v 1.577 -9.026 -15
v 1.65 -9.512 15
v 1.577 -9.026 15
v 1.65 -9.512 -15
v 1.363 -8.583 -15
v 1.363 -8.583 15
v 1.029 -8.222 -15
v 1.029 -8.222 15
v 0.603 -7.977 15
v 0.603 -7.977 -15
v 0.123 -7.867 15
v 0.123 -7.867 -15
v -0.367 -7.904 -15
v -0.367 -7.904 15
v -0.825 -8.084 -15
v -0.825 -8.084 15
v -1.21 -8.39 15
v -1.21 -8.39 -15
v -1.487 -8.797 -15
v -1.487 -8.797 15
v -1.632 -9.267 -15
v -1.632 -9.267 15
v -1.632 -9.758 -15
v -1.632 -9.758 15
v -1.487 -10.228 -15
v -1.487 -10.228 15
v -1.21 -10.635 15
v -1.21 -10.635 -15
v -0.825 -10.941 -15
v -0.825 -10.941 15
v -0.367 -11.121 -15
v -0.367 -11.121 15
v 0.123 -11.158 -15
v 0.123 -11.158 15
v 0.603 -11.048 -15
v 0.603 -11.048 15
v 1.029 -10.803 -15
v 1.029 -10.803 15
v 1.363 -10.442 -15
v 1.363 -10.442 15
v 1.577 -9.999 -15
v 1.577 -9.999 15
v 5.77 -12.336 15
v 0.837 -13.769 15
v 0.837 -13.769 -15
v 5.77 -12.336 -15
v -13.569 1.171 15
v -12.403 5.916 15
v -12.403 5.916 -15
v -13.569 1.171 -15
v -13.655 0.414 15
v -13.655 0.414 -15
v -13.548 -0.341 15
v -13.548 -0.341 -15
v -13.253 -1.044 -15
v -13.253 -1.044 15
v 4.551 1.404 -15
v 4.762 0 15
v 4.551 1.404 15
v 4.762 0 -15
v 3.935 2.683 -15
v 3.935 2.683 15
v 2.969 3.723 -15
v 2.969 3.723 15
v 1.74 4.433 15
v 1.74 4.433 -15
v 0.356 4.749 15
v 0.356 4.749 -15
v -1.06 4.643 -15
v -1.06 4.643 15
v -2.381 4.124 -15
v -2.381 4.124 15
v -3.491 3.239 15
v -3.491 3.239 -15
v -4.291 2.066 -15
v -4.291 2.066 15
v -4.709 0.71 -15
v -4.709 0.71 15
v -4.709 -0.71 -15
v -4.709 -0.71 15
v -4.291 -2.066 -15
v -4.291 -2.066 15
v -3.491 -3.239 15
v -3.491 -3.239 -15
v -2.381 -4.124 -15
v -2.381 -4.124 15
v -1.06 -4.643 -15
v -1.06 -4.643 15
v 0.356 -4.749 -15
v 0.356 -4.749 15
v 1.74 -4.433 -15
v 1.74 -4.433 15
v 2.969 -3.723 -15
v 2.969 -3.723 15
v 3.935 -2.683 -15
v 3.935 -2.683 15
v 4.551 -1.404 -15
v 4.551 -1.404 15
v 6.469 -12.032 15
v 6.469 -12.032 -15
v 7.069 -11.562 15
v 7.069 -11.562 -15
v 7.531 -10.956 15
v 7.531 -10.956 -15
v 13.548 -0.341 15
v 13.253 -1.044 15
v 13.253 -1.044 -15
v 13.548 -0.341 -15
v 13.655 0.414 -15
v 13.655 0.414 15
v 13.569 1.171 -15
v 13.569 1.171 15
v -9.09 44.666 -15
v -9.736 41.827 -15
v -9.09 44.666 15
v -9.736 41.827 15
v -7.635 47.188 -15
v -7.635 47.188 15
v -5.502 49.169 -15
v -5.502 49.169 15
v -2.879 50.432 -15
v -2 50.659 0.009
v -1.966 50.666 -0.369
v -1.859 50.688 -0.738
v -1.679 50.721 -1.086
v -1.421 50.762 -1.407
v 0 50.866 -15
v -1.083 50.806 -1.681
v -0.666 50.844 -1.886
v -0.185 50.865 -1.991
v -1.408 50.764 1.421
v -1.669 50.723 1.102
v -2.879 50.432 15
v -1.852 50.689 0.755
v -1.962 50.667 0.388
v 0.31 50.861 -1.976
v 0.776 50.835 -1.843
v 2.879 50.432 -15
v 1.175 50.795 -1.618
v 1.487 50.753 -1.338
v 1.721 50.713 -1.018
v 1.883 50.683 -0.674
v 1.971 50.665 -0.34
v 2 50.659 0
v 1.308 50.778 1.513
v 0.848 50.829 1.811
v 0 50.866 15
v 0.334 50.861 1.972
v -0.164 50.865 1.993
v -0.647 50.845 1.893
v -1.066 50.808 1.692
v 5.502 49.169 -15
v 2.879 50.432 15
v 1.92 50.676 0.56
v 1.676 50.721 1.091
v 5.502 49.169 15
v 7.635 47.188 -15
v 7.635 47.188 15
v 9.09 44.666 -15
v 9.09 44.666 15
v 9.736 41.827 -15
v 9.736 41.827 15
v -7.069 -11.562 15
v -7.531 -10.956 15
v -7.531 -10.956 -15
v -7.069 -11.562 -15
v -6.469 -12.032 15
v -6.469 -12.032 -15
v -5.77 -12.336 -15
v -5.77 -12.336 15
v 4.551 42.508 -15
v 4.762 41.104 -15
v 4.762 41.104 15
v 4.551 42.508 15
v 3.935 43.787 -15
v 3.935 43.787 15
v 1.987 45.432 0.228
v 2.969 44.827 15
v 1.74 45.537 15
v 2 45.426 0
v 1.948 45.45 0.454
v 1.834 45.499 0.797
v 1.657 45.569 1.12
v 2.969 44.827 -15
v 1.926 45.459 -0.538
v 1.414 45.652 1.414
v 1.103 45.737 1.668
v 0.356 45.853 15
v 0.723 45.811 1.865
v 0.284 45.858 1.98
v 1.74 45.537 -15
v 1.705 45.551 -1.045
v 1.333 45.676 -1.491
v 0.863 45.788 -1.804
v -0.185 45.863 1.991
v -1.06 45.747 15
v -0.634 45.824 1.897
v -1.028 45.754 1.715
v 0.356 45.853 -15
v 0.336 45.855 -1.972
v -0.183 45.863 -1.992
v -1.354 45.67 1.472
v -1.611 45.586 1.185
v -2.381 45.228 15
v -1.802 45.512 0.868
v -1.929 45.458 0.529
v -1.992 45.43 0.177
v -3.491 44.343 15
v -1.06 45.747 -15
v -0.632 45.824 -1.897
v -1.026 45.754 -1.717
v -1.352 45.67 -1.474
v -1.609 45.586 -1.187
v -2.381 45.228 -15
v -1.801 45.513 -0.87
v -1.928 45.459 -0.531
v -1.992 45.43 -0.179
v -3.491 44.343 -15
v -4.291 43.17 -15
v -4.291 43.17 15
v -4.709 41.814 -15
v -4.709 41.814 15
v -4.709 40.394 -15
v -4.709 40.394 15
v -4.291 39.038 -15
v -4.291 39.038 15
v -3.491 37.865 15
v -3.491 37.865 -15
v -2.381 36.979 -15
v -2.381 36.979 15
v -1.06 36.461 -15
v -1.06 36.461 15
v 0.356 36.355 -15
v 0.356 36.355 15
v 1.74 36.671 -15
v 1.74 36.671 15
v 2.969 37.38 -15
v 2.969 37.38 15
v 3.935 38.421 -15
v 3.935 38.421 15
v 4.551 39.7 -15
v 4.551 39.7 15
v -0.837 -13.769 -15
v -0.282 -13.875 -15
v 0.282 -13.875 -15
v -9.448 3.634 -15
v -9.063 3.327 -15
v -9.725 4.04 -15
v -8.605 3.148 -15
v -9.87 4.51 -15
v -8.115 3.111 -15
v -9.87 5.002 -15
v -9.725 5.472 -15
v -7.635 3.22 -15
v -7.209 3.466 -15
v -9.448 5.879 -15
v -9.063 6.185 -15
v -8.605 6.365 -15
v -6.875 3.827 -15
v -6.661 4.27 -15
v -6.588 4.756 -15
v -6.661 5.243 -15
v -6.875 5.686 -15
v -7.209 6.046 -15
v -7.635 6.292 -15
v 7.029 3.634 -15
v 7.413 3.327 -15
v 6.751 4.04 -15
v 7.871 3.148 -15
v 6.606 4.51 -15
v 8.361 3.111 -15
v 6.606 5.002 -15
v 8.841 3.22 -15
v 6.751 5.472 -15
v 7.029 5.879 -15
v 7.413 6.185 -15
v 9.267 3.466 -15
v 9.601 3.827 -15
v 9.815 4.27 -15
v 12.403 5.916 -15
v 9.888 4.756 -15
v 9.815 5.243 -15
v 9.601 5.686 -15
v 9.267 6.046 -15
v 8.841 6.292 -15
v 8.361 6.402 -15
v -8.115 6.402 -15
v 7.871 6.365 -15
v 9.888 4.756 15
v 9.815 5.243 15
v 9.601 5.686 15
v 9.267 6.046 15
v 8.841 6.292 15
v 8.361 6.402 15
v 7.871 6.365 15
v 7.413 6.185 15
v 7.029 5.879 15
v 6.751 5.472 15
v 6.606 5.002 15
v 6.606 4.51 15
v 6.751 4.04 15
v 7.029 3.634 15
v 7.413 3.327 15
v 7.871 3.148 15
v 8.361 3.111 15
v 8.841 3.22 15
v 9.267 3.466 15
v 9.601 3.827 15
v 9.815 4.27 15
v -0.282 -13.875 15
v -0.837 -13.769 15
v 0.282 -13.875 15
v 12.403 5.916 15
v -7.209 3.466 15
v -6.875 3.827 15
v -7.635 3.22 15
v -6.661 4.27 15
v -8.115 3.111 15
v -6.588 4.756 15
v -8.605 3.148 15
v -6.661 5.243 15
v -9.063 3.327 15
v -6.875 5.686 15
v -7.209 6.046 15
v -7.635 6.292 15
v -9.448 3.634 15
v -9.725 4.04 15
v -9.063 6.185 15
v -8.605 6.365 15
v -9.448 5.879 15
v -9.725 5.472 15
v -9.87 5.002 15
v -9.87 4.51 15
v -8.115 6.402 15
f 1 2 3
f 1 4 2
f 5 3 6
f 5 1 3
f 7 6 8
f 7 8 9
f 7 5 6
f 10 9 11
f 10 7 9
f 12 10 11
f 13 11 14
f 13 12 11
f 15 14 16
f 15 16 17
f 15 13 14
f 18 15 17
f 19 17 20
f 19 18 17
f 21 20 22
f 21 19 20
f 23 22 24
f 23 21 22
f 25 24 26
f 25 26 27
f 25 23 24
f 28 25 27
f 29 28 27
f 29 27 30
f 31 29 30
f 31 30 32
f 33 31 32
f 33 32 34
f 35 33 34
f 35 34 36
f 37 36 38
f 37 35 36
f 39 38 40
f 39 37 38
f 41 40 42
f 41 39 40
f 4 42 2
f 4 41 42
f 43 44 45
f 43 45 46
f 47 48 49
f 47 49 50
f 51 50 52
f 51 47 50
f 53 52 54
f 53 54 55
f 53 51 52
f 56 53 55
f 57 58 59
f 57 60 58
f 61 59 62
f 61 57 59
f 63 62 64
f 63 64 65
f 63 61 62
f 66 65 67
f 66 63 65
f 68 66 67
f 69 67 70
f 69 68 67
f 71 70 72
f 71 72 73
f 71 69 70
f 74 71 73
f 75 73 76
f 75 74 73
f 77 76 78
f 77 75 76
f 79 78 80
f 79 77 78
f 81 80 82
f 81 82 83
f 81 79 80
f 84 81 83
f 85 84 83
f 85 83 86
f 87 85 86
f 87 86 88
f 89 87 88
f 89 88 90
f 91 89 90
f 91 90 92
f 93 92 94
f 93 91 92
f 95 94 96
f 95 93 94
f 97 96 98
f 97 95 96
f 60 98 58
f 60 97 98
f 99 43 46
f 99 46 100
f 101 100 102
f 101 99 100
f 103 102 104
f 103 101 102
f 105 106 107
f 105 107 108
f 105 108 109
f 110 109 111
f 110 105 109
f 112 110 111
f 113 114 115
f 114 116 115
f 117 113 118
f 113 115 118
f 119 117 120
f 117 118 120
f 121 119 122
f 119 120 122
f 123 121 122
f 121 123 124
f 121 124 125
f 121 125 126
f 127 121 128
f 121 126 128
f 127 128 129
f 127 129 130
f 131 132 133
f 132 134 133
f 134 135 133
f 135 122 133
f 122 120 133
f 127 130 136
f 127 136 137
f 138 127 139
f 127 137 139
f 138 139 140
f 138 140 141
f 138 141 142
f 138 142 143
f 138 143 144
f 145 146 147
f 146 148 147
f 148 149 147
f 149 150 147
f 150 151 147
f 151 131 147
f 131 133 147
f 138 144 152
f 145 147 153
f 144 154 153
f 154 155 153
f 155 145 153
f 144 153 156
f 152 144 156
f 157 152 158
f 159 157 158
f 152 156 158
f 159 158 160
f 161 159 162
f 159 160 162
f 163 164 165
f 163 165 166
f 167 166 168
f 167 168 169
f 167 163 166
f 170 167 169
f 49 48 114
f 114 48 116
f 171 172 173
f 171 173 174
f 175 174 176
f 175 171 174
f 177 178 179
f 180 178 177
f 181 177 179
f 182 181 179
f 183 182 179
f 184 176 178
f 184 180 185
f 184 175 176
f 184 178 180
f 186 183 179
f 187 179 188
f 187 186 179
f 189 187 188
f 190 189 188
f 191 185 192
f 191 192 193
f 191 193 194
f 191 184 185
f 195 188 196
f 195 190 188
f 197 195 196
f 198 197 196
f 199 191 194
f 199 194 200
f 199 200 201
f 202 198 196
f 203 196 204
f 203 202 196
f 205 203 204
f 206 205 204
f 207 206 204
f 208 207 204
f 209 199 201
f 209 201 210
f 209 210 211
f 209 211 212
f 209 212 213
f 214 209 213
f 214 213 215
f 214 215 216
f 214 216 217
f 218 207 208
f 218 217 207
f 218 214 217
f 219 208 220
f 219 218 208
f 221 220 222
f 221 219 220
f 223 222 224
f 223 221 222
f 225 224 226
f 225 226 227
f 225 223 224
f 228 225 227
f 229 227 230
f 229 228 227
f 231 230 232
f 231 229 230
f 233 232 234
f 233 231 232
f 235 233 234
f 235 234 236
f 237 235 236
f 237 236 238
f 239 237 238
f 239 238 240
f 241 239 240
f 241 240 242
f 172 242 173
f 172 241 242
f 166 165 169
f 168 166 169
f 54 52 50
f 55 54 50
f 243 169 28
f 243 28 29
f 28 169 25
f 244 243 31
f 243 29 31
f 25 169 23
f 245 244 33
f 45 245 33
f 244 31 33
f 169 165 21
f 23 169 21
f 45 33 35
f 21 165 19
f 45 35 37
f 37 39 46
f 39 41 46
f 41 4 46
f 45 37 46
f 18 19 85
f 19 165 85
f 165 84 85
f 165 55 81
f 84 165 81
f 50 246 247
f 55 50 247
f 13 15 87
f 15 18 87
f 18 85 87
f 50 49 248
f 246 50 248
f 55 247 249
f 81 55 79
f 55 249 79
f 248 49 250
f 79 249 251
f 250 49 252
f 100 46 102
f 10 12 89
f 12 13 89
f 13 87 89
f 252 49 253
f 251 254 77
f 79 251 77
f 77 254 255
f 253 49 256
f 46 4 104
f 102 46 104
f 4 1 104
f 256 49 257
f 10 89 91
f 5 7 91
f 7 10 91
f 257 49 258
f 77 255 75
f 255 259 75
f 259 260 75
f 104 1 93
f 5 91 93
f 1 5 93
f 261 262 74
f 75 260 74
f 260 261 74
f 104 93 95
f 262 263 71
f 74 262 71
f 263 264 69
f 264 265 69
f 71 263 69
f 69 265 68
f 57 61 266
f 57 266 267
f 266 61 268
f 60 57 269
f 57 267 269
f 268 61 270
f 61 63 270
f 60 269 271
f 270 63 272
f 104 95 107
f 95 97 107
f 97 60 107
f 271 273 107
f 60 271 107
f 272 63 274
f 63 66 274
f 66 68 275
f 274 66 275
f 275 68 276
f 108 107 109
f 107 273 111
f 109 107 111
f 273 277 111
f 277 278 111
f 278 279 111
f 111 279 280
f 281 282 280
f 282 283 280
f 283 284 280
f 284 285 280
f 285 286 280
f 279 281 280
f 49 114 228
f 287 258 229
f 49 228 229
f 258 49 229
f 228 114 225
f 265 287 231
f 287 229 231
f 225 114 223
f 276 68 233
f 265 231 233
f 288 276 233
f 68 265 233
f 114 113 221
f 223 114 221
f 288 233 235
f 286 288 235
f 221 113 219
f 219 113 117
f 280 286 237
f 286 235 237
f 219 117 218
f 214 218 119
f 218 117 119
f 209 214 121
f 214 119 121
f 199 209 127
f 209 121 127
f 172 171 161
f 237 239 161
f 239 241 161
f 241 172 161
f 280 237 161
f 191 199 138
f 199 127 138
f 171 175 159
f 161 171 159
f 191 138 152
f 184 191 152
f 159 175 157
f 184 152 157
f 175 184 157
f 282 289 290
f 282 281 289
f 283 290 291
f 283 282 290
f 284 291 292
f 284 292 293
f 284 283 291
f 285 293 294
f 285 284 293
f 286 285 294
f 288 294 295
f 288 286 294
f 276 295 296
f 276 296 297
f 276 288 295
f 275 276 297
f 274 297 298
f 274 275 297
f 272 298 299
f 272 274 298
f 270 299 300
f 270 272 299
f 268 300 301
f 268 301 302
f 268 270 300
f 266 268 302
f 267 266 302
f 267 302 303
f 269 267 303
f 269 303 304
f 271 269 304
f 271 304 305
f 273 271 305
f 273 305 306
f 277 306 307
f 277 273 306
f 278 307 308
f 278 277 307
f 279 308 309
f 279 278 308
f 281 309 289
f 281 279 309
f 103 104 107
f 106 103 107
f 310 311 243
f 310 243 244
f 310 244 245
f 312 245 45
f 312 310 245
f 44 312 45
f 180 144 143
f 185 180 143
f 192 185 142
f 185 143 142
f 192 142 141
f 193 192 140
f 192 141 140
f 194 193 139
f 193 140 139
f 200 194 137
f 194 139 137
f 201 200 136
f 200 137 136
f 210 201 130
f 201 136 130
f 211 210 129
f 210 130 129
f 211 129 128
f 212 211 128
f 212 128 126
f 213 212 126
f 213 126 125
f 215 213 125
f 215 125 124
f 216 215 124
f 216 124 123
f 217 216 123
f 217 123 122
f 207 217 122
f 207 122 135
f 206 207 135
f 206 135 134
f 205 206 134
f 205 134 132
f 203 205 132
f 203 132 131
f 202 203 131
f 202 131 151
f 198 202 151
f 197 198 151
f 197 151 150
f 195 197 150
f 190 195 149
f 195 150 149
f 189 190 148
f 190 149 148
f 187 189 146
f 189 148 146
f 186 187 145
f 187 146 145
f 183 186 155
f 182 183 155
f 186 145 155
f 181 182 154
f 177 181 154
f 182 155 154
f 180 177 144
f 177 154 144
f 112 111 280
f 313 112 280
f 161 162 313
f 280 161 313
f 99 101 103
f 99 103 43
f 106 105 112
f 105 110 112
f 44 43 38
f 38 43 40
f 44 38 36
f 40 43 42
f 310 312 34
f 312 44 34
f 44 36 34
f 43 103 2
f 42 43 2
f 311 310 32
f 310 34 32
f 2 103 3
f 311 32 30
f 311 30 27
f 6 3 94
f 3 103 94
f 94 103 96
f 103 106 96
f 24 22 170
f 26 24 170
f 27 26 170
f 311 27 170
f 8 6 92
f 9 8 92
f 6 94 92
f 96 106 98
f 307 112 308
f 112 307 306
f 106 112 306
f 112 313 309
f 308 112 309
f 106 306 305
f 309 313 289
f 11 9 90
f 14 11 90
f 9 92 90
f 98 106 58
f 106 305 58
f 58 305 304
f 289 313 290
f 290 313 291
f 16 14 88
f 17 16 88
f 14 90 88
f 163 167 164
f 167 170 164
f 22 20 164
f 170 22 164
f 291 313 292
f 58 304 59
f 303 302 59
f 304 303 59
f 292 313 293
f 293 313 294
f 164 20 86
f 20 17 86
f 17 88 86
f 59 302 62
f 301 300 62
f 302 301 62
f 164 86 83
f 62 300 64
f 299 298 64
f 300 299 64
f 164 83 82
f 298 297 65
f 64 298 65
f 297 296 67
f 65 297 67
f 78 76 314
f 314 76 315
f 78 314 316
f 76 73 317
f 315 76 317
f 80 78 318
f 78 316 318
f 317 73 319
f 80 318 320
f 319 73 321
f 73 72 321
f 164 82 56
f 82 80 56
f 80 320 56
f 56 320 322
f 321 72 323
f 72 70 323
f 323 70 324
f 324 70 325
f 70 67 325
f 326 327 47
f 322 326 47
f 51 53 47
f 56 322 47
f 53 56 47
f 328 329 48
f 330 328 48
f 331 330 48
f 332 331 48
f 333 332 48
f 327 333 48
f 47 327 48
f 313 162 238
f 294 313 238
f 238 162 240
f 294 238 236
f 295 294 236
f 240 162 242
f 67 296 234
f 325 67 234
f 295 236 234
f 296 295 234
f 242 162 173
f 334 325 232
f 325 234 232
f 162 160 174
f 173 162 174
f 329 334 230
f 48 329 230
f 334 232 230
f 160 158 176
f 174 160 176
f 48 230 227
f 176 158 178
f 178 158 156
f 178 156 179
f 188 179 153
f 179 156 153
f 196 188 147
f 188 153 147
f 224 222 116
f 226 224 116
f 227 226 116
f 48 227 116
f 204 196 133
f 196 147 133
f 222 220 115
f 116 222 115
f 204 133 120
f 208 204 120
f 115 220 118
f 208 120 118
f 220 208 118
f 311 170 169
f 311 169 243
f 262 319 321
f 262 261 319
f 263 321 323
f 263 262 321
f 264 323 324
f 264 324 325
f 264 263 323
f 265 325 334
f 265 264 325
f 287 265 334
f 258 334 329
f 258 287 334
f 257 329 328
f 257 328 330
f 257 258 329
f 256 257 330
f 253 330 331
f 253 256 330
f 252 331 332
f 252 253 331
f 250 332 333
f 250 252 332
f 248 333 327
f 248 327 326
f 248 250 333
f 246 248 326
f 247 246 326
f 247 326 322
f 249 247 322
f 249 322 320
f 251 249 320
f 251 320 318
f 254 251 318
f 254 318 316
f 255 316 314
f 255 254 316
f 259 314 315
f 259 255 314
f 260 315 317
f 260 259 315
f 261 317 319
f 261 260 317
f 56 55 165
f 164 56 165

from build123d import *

# Parameters (mm, degrees)
SKETCH1_R           = 4.7625
SKETCH1_R_2         = 1.65
BOSS_EXTRUDE1_DEPTH = 15
SKETCH2_R           = 4.7625
BOSS_EXTRUDE2_DEPTH = 15
CUT_EXTRUDE1_REACH  = 66.755
SKETCH3_R           = 2


with BuildPart() as part:
    # Sketch1 → Boss-Extrude1 (new body, symmetric)
    with BuildSketch(Plane.XY):
        with BuildLine():
            Line((-13.253372163, -1.044486042), (-7.531237528, -10.955513958))
            ThreePointArc((-7.531237528, -10.955513958), (-6.784217233, -11.816359568), (-5.770008435, -12.336431676))
            Line((-5.770008435, -12.336431676), (-0.836847118, -13.76941319))
            ThreePointArc((-0.836847118, -13.76941319), (0, -13.888495471), (0.836847118, -13.76941319))
            Line((0.836847118, -13.76941319), (5.770008435, -12.336431676))
            ThreePointArc((5.770008435, -12.336431676), (6.784217233, -11.816359568), (7.531237528, -10.955513958))
            Line((7.531237528, -10.955513958), (13.253372163, -1.044486042))
            ThreePointArc((13.253372163, -1.044486042), (13.625376182, 0.032875315), (13.568667441, 1.171241953))
            Line((13.568667441, 1.171241953), (12.343085176, 6.159975731))
            ThreePointArc((12.343085176, 6.159975731), (12.027789898, 6.944247736), (11.506238058, 7.609437458))
            Line((11.506238058, 7.609437458), (7.798659006, 11.165189723))
            ThreePointArc((7.798659006, 11.165189723), (6.841158949, 11.783484253), (5.722134635, 12))
            Line((5.722134635, 12), (-5.722134635, 12))
            ThreePointArc((-5.722134635, 12), (-6.841158949, 11.783484253), (-7.798659006, 11.165189723))
            Line((-7.798659006, 11.165189723), (-11.506238058, 7.609437458))
            ThreePointArc((-11.506238058, 7.609437458), (-12.027789898, 6.944247736), (-12.343085176, 6.159975731))
            Line((-12.343085176, 6.159975731), (-13.568667441, 1.171241953))
            ThreePointArc((-13.568667441, 1.171241953), (-13.625376182, 0.032875315), (-13.253372163, -1.044486042))
        make_face()
        Circle(SKETCH1_R, mode=Mode.SUBTRACT)
        with Locations((-8.238066653, 4.75625)):
            Circle(SKETCH1_R_2, mode=Mode.SUBTRACT)
        with Locations((8.238066653, 4.75625)):
            Circle(SKETCH1_R_2, mode=Mode.SUBTRACT)
        with Locations((0, -9.5125)):
            Circle(SKETCH1_R_2, mode=Mode.SUBTRACT)
    extrude(amount=BOSS_EXTRUDE1_DEPTH, both=True)

    # Sketch2 → Boss-Extrude2 (add, symmetric)
    with BuildSketch(Plane.XY):
        with BuildLine():
            Line((-12.421472807, 5.666457921), (-9.735682804, 41.826981922))
            ThreePointArc((-9.735682804, 41.826981922), (0, 50.866372944), (9.735682804, 41.826981922))
            Line((9.735682804, 41.826981922), (12.421472807, 5.666457921))
            Line((12.421472807, 5.666457921), (0, 12))
            Line((0, 12), (-12.421472807, 5.666457921))
        make_face()
        with Locations((0, 41.103872944)):
            Circle(SKETCH2_R, mode=Mode.SUBTRACT)
    extrude(amount=BOSS_EXTRUDE2_DEPTH, both=True)

    # Sketch3 → Cut-Extrude1 (cut, up to next)
    with BuildSketch(Plane(origin=(0, 50.866372944, 0), x_dir=(1, 0, 0), z_dir=(0, 1, 0)), mode=Mode.PRIVATE) as cut_extrude1_sk1:
        Circle(SKETCH3_R)
    cut_extrude1_tool1 = extrude(cut_extrude1_sk1.sketch, amount=-CUT_EXTRUDE1_REACH, mode=Mode.PRIVATE) & part.part
    add(cut_extrude1_tool1.solids().sort_by_distance((0, 50.866373, 0))[0], mode=Mode.SUBTRACT)


solid = part.part
